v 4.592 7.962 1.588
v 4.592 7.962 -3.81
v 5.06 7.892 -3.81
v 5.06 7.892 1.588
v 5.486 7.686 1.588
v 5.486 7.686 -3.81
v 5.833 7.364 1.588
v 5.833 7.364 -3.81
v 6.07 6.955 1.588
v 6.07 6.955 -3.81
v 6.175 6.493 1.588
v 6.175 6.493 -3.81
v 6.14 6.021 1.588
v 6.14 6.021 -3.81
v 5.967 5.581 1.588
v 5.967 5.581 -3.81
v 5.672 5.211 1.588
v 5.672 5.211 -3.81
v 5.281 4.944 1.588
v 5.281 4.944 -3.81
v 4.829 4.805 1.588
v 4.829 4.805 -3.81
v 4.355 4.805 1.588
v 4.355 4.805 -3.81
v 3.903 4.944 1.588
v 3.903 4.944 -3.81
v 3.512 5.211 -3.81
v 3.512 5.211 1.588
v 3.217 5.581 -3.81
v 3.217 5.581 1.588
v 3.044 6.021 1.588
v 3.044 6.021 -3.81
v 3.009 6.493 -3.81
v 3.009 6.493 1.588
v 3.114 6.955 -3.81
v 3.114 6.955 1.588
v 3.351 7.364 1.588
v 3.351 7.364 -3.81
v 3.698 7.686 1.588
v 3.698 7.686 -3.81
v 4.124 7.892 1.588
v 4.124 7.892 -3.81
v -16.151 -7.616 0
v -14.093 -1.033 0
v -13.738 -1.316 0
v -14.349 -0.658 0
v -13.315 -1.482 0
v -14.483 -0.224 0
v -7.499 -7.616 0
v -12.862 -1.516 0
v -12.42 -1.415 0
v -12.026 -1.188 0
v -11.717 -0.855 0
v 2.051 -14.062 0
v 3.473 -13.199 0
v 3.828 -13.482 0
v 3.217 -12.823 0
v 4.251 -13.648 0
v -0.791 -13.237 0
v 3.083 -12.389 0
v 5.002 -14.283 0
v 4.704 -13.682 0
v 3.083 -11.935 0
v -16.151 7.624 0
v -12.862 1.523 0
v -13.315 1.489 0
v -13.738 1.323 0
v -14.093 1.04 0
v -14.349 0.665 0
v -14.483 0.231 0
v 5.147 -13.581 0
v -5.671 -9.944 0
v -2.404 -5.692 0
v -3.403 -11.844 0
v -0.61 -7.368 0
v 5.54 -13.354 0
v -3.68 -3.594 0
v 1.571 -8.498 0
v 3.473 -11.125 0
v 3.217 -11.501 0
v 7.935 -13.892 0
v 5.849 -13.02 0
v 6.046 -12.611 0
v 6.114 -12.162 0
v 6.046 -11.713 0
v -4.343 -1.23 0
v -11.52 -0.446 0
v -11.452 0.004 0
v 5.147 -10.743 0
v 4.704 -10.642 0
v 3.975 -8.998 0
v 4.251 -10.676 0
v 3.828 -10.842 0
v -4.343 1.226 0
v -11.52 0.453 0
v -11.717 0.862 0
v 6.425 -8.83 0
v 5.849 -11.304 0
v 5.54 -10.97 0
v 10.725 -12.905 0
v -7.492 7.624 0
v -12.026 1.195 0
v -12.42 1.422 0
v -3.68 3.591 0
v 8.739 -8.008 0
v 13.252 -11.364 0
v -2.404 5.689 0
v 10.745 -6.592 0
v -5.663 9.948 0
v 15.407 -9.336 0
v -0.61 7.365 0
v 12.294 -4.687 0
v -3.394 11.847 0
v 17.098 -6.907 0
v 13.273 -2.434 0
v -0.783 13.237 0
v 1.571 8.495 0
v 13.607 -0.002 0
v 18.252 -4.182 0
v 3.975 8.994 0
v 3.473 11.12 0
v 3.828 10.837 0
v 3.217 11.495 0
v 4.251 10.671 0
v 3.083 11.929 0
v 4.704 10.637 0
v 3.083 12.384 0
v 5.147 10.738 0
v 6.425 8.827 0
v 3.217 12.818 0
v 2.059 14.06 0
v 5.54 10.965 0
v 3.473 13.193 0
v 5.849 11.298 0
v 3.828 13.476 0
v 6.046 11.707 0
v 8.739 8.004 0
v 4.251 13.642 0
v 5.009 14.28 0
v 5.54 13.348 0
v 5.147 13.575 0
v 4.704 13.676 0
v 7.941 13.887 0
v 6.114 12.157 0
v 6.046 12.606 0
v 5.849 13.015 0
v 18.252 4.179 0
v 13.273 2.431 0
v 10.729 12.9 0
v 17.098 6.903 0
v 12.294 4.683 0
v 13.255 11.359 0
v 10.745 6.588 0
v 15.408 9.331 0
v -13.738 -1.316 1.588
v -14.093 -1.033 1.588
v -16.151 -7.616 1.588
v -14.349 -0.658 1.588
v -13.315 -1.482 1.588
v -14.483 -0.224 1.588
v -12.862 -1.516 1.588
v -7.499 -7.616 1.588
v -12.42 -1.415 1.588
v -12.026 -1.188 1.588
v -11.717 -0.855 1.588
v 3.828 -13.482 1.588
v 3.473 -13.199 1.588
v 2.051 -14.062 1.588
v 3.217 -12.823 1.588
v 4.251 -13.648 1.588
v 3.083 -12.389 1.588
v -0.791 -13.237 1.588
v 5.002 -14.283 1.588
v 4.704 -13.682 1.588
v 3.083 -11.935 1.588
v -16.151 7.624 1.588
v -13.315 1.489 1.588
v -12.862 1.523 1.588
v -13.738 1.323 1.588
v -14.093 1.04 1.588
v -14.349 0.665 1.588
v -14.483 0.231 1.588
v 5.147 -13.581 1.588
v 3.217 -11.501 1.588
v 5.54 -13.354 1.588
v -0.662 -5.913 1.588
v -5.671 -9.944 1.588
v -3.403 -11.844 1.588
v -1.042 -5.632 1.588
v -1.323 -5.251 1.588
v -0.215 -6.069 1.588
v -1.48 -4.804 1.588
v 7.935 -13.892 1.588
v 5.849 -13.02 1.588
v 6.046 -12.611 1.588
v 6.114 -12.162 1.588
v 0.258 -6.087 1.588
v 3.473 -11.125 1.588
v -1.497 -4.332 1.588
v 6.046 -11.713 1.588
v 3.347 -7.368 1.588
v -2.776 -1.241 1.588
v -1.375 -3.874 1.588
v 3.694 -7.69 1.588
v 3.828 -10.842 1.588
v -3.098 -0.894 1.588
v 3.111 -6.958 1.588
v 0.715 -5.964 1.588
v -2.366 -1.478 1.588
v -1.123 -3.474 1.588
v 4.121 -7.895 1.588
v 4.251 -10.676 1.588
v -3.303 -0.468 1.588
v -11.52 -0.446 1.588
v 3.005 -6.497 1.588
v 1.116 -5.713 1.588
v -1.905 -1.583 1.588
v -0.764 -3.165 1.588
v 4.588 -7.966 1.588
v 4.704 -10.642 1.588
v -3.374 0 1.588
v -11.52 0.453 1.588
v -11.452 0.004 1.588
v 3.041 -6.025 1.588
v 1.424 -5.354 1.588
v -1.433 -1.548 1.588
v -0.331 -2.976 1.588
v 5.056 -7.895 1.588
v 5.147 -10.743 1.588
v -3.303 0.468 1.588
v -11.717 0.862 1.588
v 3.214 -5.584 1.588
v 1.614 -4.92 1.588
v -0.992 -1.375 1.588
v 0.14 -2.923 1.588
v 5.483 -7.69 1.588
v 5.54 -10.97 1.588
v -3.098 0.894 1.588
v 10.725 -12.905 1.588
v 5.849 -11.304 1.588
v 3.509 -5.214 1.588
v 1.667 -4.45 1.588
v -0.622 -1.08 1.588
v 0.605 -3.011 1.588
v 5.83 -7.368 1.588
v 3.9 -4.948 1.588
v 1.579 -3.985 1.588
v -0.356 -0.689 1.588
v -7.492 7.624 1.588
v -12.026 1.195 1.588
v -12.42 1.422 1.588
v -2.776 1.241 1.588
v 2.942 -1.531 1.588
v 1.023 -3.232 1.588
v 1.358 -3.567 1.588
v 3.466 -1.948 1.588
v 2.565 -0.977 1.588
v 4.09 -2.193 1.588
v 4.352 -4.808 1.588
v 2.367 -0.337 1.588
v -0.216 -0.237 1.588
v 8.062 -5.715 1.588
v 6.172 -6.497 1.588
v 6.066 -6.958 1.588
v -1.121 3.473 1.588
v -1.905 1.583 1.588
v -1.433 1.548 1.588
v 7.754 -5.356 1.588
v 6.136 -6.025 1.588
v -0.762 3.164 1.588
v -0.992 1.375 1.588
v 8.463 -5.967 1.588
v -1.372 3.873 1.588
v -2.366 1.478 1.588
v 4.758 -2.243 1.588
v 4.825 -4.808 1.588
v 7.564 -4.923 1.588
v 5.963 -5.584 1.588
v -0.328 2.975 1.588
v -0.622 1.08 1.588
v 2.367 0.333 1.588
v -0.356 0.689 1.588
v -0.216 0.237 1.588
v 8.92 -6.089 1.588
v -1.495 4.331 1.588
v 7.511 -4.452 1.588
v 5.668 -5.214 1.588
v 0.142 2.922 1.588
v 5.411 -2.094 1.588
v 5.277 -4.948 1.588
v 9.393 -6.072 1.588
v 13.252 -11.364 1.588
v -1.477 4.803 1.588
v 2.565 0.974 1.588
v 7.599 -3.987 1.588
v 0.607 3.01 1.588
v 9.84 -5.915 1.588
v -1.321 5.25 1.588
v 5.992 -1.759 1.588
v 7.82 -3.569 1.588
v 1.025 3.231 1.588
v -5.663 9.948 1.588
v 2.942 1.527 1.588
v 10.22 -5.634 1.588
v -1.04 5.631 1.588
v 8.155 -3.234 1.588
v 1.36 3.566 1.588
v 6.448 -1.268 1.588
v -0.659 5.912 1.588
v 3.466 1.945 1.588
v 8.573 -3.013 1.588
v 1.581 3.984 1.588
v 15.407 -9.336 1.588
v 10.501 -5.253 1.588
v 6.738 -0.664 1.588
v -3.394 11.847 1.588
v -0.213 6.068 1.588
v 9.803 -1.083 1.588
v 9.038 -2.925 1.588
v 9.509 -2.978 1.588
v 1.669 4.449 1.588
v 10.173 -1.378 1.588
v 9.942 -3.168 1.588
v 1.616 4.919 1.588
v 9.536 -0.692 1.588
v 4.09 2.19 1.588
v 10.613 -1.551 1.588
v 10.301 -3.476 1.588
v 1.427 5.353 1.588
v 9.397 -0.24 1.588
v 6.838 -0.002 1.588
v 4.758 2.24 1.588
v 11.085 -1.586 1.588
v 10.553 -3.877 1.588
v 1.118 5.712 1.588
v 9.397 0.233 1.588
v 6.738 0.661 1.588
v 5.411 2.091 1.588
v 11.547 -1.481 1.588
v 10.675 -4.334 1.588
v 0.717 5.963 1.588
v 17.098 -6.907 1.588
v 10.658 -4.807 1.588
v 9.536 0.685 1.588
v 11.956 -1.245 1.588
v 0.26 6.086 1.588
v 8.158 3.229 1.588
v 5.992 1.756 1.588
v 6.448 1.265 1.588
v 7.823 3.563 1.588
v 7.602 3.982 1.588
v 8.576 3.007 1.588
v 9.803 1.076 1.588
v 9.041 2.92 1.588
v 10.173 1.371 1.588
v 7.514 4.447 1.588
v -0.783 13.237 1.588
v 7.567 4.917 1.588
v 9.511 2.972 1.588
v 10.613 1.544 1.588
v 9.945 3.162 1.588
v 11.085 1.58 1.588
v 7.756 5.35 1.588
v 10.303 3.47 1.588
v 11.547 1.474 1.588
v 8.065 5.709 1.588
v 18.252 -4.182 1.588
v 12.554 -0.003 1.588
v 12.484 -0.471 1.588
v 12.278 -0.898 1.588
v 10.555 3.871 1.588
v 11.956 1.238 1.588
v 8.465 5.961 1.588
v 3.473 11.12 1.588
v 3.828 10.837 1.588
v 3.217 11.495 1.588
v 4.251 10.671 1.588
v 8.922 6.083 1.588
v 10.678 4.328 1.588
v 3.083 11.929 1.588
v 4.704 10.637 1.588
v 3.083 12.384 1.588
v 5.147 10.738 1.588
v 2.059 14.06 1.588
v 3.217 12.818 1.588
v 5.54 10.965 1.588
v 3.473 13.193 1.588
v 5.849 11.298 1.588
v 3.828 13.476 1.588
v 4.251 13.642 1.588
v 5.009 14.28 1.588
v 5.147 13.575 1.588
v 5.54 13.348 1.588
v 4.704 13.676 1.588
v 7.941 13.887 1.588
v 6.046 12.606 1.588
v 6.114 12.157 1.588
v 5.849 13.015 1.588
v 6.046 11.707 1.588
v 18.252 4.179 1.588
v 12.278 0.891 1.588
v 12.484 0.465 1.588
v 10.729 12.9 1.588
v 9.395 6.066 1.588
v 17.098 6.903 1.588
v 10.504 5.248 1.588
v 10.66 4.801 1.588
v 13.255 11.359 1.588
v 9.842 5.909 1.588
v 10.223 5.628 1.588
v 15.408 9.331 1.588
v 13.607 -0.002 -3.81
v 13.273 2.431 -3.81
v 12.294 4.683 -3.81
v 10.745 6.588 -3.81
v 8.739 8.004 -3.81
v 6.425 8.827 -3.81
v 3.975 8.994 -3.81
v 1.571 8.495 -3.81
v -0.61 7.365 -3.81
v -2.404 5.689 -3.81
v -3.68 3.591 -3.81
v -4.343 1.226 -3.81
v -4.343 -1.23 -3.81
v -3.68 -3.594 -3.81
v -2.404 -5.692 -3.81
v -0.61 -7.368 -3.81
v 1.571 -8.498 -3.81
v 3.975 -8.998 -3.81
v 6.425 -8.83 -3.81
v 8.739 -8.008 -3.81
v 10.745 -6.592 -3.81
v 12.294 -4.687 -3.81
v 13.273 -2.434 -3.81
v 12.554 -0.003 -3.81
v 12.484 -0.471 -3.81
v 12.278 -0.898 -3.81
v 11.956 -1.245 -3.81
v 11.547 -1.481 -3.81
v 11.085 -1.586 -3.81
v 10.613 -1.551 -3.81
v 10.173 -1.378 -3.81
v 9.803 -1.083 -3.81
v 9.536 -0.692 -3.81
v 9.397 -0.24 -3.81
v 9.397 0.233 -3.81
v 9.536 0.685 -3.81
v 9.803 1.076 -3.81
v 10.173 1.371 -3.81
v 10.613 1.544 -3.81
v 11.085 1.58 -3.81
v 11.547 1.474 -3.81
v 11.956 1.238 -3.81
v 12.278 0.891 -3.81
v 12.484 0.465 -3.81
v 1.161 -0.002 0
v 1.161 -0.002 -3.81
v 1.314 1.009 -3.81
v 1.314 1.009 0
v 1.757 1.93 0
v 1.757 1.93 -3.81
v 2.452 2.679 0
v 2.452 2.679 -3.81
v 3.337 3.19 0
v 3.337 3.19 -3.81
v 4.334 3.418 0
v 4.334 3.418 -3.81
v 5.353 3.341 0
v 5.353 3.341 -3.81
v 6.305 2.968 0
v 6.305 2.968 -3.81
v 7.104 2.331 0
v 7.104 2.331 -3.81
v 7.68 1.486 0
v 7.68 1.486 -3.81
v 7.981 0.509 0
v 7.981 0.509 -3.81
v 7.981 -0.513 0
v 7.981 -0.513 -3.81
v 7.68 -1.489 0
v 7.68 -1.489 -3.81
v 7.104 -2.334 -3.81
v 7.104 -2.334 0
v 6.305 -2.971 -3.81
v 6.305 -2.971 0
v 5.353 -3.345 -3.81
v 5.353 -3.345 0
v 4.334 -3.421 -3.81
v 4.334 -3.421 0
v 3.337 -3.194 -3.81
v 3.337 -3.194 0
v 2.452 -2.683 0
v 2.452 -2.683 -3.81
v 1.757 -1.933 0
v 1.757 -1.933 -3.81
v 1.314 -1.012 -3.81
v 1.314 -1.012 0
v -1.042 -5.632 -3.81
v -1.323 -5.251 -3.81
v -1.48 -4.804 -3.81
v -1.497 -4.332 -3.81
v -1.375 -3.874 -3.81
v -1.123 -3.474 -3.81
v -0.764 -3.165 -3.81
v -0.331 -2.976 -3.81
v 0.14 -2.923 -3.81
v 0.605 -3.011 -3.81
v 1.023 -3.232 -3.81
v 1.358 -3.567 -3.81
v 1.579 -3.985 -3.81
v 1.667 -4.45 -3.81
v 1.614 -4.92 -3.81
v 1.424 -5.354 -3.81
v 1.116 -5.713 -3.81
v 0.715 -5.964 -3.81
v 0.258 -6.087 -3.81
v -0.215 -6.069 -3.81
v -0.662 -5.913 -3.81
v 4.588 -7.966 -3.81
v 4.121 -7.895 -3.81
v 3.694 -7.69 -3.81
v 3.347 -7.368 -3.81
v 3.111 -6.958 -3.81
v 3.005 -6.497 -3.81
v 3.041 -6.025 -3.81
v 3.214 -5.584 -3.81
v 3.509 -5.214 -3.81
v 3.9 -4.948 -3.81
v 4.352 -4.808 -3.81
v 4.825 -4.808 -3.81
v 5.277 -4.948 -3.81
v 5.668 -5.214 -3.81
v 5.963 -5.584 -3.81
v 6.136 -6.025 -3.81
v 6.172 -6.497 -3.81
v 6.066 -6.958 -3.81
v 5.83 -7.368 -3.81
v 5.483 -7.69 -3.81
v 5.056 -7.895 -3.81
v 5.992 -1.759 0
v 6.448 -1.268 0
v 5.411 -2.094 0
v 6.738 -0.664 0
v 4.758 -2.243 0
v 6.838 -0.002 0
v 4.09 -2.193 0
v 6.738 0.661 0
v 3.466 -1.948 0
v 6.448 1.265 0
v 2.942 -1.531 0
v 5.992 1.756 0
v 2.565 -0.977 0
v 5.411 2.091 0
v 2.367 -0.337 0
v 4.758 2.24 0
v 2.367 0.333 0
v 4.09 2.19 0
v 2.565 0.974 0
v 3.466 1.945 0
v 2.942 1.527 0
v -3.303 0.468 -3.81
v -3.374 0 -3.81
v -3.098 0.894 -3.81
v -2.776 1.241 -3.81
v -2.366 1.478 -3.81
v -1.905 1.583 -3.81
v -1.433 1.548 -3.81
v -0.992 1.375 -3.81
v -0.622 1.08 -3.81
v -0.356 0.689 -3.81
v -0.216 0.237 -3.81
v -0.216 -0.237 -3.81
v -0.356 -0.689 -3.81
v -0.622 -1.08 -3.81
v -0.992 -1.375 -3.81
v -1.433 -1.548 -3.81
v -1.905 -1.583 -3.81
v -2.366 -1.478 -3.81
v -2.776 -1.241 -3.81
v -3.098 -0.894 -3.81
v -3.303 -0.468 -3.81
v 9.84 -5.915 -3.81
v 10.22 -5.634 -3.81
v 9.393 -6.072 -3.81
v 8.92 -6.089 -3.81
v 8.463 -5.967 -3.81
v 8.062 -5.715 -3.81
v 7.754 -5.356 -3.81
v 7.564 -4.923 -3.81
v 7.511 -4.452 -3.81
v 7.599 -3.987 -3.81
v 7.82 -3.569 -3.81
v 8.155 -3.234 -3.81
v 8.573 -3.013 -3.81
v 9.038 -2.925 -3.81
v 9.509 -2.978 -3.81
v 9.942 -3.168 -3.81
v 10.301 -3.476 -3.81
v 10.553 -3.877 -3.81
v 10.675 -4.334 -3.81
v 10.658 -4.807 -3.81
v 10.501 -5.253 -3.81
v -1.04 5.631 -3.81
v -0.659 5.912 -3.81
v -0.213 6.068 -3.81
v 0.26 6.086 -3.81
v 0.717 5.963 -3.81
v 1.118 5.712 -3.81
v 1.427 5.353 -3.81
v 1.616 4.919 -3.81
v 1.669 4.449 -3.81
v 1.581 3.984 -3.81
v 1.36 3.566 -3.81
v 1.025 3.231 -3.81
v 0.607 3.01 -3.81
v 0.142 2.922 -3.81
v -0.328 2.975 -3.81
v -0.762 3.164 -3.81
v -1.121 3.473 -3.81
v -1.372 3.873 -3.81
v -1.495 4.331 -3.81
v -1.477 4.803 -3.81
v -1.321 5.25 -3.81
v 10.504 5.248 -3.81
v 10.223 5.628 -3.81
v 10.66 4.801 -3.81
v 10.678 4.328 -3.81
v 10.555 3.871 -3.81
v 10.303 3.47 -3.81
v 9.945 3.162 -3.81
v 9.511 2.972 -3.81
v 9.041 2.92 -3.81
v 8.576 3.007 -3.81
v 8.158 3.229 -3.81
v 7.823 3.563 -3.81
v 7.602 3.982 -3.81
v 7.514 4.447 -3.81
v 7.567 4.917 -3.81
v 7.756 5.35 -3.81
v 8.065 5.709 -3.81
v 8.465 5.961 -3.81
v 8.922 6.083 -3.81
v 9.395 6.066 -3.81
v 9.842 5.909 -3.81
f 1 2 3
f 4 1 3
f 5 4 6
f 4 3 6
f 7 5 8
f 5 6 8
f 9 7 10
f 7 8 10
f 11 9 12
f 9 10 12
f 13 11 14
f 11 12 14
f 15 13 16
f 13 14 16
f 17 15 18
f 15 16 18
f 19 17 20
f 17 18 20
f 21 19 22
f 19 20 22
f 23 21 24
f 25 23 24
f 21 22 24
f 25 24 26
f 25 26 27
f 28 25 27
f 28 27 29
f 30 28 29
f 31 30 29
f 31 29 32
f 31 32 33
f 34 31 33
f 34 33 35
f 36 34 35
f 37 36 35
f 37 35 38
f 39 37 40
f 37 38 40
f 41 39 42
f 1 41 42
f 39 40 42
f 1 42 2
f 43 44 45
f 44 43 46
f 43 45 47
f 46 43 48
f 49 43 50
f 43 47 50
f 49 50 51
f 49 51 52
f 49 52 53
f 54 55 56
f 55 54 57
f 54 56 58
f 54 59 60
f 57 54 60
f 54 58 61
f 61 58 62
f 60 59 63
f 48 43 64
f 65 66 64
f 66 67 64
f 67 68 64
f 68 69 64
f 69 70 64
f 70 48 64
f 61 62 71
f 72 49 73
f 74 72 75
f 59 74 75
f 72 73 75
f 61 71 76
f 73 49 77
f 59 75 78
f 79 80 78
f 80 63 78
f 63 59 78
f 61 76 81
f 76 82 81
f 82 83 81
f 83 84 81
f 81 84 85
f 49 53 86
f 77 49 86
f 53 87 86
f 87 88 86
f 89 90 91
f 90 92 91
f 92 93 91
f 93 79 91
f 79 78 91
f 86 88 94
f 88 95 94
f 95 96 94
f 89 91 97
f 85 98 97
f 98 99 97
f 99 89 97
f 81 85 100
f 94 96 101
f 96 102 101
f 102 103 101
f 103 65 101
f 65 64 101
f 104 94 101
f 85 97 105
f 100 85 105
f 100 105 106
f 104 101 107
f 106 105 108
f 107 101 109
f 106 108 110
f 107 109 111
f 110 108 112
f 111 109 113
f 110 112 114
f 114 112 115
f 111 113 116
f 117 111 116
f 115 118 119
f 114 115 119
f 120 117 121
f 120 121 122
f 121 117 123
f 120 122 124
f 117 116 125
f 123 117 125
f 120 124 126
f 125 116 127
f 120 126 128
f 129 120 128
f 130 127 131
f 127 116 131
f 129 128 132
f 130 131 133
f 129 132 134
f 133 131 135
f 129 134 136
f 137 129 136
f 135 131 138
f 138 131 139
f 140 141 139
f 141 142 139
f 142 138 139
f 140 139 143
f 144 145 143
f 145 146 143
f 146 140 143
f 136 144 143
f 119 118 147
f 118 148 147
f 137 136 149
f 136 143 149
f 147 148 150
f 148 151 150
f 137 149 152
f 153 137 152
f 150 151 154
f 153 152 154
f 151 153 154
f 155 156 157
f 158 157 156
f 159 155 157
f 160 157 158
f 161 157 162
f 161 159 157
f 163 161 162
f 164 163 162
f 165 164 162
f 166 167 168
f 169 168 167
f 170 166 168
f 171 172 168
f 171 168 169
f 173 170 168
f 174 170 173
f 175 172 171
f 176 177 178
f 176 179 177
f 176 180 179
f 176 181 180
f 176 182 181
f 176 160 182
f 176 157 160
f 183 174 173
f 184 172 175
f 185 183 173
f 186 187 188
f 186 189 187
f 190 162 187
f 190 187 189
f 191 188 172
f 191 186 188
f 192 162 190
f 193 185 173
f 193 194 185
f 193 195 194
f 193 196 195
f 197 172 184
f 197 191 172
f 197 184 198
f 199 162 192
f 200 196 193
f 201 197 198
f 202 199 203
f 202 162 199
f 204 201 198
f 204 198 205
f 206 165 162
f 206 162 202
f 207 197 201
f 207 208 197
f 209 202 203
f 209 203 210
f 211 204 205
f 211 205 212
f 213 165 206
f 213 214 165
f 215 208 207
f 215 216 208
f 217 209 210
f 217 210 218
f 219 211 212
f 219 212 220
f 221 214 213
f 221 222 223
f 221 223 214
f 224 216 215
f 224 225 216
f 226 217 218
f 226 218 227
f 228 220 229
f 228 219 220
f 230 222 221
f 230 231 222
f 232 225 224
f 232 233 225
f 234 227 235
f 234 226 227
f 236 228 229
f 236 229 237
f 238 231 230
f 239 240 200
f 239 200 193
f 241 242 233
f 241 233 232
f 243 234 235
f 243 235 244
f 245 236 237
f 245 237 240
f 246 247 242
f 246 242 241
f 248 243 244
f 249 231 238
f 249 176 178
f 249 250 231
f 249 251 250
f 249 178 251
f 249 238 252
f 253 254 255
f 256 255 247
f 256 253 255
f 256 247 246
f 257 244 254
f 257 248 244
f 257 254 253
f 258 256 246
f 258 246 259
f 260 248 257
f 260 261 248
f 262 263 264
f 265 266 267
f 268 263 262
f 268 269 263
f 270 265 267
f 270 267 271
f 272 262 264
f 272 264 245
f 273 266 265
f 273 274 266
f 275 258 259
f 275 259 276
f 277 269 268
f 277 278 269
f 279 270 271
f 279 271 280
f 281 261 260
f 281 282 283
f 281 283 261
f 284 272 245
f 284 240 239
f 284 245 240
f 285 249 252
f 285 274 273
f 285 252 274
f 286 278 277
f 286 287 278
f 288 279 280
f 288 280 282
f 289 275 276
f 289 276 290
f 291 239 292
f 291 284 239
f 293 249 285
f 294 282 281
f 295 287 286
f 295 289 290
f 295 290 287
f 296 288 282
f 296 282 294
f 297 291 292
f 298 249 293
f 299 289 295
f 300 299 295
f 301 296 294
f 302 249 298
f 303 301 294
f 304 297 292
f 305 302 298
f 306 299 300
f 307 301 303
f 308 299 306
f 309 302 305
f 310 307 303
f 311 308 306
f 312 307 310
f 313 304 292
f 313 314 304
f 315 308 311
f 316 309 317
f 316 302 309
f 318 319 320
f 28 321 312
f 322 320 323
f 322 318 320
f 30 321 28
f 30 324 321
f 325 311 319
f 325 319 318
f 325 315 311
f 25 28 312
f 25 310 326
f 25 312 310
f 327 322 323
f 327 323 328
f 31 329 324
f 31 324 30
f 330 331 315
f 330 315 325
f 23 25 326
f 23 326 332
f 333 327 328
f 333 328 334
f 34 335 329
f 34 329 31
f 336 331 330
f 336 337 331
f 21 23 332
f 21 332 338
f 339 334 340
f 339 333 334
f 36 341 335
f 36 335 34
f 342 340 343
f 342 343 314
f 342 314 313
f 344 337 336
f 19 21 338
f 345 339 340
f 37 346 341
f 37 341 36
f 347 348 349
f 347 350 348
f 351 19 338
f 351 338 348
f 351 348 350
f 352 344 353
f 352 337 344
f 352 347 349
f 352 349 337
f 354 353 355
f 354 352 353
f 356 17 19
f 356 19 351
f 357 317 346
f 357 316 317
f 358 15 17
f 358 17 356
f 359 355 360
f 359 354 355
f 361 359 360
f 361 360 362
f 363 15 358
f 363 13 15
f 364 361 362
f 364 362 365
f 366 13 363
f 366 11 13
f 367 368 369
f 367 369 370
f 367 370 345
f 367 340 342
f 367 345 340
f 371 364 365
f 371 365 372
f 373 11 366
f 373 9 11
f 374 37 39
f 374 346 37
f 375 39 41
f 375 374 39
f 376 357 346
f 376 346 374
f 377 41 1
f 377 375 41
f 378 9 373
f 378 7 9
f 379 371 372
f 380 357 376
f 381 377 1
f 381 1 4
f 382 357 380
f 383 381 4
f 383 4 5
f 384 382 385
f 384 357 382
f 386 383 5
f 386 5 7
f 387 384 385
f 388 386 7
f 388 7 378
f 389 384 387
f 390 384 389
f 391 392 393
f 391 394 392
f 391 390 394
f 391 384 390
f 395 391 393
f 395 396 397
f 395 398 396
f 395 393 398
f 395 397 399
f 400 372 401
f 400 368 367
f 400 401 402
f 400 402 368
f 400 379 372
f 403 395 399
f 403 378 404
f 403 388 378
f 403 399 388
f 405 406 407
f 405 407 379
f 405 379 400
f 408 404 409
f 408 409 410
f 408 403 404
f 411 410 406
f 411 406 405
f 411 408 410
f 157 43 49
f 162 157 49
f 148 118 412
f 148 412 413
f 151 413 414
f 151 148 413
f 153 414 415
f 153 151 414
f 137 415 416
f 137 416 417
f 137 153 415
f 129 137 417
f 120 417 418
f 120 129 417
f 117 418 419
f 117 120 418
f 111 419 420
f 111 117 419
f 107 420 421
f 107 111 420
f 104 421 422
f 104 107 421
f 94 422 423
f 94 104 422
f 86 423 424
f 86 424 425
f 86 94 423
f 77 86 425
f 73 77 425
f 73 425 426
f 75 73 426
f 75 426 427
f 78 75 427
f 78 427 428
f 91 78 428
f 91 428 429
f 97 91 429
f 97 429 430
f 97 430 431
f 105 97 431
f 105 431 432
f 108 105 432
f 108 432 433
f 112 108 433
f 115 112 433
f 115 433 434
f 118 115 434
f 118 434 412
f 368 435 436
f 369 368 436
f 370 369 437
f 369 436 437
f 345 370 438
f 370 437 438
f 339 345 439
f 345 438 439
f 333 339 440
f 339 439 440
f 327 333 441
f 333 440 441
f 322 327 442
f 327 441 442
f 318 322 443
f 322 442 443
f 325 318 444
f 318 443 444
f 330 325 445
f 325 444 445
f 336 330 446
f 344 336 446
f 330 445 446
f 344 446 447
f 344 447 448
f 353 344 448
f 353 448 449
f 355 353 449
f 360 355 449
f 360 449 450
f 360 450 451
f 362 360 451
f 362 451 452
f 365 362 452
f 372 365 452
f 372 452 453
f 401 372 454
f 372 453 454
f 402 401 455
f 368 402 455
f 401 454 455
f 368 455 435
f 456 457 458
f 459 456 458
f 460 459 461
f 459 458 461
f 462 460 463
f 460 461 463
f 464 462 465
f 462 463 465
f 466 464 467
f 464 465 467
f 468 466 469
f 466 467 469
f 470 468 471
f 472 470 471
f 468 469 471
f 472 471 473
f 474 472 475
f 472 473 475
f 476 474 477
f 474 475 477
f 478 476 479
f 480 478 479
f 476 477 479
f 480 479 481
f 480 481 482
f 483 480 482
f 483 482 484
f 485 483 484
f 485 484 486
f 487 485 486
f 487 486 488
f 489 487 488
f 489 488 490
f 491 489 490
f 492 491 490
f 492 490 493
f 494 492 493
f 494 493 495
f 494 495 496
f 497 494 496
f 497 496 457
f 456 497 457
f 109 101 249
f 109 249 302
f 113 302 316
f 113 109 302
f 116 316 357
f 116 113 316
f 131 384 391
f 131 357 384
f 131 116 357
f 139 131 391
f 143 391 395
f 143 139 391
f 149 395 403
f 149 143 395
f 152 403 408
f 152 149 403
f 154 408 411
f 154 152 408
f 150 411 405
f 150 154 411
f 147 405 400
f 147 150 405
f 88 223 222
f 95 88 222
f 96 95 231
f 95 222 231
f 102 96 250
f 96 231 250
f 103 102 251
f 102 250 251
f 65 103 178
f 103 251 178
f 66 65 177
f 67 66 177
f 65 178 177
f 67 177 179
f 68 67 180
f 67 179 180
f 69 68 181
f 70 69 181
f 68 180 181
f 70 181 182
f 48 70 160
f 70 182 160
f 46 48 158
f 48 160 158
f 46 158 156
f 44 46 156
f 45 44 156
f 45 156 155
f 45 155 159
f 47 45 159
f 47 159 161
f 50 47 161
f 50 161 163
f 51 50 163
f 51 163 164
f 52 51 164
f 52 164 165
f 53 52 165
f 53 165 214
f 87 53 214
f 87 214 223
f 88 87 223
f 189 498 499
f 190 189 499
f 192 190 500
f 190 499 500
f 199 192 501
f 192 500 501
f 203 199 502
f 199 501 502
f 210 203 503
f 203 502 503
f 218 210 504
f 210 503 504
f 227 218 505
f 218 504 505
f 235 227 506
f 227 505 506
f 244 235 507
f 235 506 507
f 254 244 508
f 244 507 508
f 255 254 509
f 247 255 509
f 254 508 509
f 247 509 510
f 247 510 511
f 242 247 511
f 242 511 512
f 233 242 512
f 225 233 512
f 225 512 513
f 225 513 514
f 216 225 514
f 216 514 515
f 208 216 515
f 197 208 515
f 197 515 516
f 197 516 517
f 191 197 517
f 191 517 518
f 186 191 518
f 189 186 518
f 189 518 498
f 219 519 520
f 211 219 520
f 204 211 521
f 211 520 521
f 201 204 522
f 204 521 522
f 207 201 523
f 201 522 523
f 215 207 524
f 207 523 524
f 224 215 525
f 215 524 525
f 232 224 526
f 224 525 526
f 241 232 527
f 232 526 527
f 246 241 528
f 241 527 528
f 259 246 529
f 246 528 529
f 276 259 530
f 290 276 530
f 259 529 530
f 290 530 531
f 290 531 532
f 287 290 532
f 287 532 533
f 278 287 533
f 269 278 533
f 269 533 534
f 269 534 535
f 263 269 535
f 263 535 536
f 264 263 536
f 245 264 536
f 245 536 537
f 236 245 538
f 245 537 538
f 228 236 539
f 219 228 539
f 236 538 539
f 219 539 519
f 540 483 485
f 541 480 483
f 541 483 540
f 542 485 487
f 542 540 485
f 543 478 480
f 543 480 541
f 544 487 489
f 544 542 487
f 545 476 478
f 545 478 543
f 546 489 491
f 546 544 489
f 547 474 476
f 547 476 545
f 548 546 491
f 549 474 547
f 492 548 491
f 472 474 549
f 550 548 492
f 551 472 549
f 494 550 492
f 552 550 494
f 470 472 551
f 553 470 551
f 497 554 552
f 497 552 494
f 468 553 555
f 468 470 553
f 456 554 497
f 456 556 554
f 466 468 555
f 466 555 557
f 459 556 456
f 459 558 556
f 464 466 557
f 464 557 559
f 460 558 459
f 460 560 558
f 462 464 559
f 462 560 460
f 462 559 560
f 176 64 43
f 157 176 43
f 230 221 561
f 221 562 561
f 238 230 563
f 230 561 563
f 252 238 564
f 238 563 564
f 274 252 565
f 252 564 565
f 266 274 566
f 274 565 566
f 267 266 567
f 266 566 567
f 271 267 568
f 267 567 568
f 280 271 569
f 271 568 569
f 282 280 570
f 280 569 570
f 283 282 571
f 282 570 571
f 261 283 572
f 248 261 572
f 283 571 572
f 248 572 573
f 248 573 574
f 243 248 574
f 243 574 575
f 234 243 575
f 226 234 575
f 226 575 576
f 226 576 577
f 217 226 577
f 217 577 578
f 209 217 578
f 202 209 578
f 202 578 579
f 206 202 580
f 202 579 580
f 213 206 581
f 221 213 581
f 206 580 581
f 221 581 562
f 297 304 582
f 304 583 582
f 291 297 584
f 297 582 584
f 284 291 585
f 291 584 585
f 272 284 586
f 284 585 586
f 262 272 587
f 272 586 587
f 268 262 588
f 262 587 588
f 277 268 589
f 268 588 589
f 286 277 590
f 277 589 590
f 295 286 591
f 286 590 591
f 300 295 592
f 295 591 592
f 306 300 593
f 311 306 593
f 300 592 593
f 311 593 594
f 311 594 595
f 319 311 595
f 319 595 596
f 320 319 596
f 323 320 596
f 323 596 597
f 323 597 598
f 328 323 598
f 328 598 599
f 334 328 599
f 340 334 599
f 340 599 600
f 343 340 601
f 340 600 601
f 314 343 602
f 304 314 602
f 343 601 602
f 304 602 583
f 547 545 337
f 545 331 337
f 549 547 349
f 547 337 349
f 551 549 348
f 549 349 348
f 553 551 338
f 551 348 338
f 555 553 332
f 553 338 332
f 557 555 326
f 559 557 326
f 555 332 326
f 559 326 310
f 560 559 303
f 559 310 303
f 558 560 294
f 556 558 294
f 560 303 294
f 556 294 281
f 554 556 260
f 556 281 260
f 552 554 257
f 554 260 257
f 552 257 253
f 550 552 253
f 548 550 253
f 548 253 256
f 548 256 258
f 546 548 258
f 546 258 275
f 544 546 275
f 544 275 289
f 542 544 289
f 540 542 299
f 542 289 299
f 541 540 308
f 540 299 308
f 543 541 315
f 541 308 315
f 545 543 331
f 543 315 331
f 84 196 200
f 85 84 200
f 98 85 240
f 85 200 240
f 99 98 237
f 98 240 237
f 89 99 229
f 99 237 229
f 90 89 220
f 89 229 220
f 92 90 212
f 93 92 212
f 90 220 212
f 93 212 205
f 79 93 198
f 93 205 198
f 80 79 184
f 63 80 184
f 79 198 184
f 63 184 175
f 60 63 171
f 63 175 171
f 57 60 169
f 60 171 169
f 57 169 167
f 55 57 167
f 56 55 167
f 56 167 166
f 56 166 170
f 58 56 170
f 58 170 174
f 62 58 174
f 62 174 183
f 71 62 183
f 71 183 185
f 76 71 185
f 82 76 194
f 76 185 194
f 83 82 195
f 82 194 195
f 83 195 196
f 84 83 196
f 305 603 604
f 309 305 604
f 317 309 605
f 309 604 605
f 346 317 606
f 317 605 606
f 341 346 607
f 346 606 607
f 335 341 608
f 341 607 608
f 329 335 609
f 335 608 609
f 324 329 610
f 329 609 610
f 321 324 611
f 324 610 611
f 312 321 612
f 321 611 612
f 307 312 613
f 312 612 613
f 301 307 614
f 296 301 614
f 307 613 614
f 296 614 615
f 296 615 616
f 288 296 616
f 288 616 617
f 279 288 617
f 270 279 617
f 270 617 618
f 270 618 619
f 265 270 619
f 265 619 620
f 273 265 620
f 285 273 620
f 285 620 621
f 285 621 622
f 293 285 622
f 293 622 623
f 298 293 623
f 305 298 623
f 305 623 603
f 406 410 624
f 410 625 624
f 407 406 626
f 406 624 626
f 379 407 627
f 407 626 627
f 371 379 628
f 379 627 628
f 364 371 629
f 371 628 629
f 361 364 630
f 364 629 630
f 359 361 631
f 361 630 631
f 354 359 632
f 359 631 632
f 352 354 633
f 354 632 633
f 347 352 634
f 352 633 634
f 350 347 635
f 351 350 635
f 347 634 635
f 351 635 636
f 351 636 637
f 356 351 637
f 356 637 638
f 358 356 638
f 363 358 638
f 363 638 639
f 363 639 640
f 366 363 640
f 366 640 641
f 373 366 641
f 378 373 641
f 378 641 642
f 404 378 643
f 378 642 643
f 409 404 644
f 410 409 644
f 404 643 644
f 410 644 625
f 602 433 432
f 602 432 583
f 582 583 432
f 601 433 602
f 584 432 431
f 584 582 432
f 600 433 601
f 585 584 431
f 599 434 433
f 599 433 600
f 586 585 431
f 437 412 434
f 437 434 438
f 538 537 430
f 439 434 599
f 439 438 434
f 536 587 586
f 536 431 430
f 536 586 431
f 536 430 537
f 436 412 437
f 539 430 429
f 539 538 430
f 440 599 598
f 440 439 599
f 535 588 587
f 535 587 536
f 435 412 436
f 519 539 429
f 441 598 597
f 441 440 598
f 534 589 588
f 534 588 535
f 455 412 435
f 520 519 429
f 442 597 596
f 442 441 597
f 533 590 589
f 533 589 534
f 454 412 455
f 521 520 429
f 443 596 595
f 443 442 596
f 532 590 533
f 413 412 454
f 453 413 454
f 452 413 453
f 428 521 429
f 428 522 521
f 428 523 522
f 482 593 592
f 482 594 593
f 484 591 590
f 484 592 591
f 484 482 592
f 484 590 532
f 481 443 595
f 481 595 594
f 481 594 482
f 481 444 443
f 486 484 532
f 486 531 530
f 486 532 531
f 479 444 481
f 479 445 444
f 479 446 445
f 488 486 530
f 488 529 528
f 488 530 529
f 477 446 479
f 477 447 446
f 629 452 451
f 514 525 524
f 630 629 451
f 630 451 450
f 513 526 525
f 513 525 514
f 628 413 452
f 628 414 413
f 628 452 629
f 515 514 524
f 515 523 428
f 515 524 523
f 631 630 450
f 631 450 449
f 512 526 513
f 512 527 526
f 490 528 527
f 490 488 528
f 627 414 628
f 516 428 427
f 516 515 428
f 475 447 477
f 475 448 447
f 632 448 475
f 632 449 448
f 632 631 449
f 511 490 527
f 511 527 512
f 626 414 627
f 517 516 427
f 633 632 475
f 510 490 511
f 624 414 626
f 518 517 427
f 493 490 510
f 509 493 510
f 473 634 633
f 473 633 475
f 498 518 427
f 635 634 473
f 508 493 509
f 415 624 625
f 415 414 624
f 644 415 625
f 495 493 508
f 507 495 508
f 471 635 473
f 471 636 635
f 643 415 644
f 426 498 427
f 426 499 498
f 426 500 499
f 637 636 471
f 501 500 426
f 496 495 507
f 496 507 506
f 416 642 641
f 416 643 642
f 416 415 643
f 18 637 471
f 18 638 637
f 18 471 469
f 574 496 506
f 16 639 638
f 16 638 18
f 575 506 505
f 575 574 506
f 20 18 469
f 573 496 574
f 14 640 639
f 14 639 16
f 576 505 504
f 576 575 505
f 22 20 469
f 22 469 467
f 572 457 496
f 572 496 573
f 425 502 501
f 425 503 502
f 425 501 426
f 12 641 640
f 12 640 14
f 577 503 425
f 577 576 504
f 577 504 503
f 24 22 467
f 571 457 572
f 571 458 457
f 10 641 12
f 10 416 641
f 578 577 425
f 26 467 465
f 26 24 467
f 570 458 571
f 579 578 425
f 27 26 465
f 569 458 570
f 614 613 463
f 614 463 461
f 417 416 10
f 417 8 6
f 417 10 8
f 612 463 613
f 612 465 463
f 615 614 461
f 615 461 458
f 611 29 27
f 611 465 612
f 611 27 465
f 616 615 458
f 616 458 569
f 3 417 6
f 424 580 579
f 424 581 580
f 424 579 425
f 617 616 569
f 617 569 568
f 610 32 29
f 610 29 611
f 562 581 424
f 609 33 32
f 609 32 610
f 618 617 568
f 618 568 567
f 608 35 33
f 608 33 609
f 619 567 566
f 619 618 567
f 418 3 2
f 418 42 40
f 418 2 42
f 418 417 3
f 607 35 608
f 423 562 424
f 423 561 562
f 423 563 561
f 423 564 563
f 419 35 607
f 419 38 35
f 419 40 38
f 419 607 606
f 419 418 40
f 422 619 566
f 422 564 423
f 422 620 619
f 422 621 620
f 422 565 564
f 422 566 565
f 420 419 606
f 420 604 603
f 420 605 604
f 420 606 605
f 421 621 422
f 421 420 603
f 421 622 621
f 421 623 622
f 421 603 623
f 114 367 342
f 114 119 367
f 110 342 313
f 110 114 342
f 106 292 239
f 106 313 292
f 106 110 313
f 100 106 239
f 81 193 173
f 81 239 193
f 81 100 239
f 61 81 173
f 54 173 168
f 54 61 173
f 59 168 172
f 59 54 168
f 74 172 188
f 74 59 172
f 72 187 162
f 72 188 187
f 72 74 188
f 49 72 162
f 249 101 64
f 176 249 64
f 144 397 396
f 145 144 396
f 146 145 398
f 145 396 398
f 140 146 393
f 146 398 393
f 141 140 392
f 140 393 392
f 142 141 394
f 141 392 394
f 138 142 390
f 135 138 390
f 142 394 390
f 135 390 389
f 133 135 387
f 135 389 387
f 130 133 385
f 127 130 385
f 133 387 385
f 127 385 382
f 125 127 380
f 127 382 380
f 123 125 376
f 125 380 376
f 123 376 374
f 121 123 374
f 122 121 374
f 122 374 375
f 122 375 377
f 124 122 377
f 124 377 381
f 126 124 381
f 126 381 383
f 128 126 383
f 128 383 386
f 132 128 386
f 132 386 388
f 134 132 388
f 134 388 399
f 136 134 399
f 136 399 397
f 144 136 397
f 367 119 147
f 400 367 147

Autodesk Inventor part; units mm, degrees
ref_plane "YZ Plane" through (0, 0, 0) normal (1, 0, 0) x (0, 1, 0)
ref_plane "XZ Plane" through (0, 0, 0) normal (0, 1, 0) x (-1, 0, 0)
ref_plane "XY Plane" through (0, 0, 0) normal (0, 0, 1) x (1, 0, 0)
sketch "Sketch1" plane through (0, 0, 0) normal (0, 0, 1) x (1, 0, 0)
  circle A0 centre (4.5902, 12.1566) radius 1.27 projected
  circle A1 centre (4.5902, -12.1619) radius 1.27 projected
  circle A2 centre (-12.9763, 0.0036) radius 1.27 projected
  line L0 (18.2524, -4.1824) -> (18.2524, 4.1791) projected
  arc A3 (18.2524, 4.1791) -> (-7.4923, 7.6236) centre (4.5902, -0.0017) ccw projected
  line L1 (-7.4923, 7.6236) -> (-16.1513, 7.6236) projected
  line L2 (-16.1513, 7.6236) -> (-16.1513, -7.6164) projected
  line L3 (-16.1513, -7.6164) -> (-7.4989, -7.6164) projected
  arc A4 (-7.4989, -7.6164) -> (18.2524, -4.1824) centre (4.5902, -0.0017) ccw projected
  line L4 (-4.9271, -3.1767) -> (-8.2305, -3.1767) projected
  arc A5 (-8.2305, 3.1733) -> (-8.2305, -3.1767) centre (4.5902, -0.0017) ccw projected
  line L5 (-8.2305, 3.1733) -> (-4.9271, 3.1733) projected
  arc A6 (-4.9271, -3.1767) -> (-4.9271, 3.1733) centre (4.5902, -0.0017) ccw projected
  circle A7 centre (4.5902, -0.0017) radius 3.175 projected
  circle A8 centre (4.5902, -0.0017) radius 9.017
  circle A9 centre (4.5902, -0.0017) radius 4.953
  point P0 (0, 0)
  dimension "d0" = 1.778
  dimension "d1" = 1.016
extrude "Extrusion1" add sketch "Sketch1" against normal blind 19.05 contours A8
sketch "Sketch2" plane through (4.5902, -0.0017, 0) normal (0, 0, 1) x (1, 0, 0)
  circle A0 centre (0, 0) radius 4.953 projected
  point P0 (-4.5902, 0.0017)
extrude "Extrusion2" add sketch "Sketch2" against normal blind 7.62
sketch "Sketch3" plane through (0, 0, 0) normal (1, 0, 0) x (0, 1, 0)
  line L0 (3.1733, -8.4292) -> (-3.1767, -8.4292) projected
  point P0 (0, 0)
sketch "Sketch5" plane through (4.5902, -0.0017, 0) normal (0, 0, 1) x (1, 0, 0)
  circle A0 centre (0, 12.1583) radius 1.27 projected
  circle A1 centre (0, -12.1603) radius 1.27 projected
  circle A2 centre (-17.5665, 0.0053) radius 1.27 projected
  line L0 (13.6621, -4.1808) -> (13.6621, 4.1808) projected
  arc A3 (13.6621, 4.1808) -> (-12.0826, 7.6253) centre (0, 0) ccw projected
  line L1 (-12.0826, 7.6253) -> (-20.7415, 7.6253) projected
  line L2 (-20.7415, 7.6253) -> (-20.7415, -7.6147) projected
  line L3 (-20.7415, -7.6147) -> (-12.0892, -7.6147) projected
  arc A4 (-12.0892, -7.6147) -> (13.6621, -4.1808) centre (0, 0) ccw projected
  line L4 (-9.5174, -3.175) -> (-12.8207, -3.175) projected
  arc A5 (-12.8207, 3.175) -> (-12.8207, -3.175) centre (0, 0) ccw projected
  line L5 (-12.8207, 3.175) -> (-9.5174, 3.175) projected
  arc A6 (-9.5174, -3.175) -> (-9.5174, 3.175) centre (0, 0) ccw projected
  point P0 (-4.5902, 0.0017)
extrude "Extrusion4" add sketch "Sketch5" along normal blind 1.5875 contours A4 L3 L2 L1 A3 L0 | L4 A5 L5 A6
sketch "Sketch6" plane through (4.5902, -0.0017, 1.5875) normal (0, 0, 1) x (1, 0, 0)
  circle A0 centre (0, -12.1603) radius 1.27 projected
  circle A1 centre (0, -12.1603) radius 1.524
  circle A2 centre (-17.5665, 0.0053) radius 1.27 projected
  circle A3 centre (-17.5665, 0.0053) radius 1.524
  circle A4 centre (0, 12.1583) radius 1.27 projected
  circle A5 centre (0, 12.1583) radius 1.524
  point P0 (-4.5902, 0.0017)
  dimension "d12" = 3.048
extrude "Extrusion5" cut sketch "Sketch6" against normal blind 1.5875
sketch "Sketch7" plane through (4.5902, -0.0017, -7.62) normal (0, 0, -1) x (-1, 0, 0)
  circle A0 centre (0, 0) radius 3.429
  point P0 (4.5902, 0.0017)
  dimension "d15" = 6.858
extrude "Extrusion6" cut sketch "Sketch7" against normal up to surface (7.62 mm away)
sketch "Sketch8" plane through (0, 0, 0) normal (0, 1, 0) x (-1, 0, 0)
  spline S0 degree 3 poles (-8.0192, -14.5252) (-8.0192, -14.0929) (-7.9325, -13.6329) (-7.5821, -12.7886) (-7.3185, -12.4041) (-6.7114, -11.797) (-6.3268, -11.5333) (-5.4824, -11.1829) (-5.0225, -11.0962) (-4.158, -11.0962) (-3.698, -11.1829) (-2.8537, -11.5333) (-2.4691, -11.797) (-1.862, -12.4041) (-1.5984, -12.7886) (-1.248, -13.6329) (-1.1612, -14.0929) (-1.1612, -14.9574) (-1.248, -15.4174) (-1.5984, -16.2617) (-1.862, -16.6463) (-2.4691, -17.2534) (-2.8537, -17.517) (-3.698, -17.8675) (-4.158, -17.9542) (-5.0225, -17.9542) (-5.4824, -17.8675) (-6.3268, -17.517) (-6.7114, -17.2534) (-7.3185, -16.6463) (-7.5821, -16.2617) (-7.9325, -15.4174) (-8.0192, -14.9574) (-8.0192, -14.5252) knots 0 0 0 0 0.129682 0.129682 0.259363 0.259363 0.389031 0.389031 0.5187 0.5187 0.648368 0.648368 0.778036 0.778036 0.907718 0.907718 1.037399 1.037399 1.167081 1.167081 1.296762 1.296762 1.426431 1.426431 1.556099 1.556099 1.685767 1.685767 1.815435 1.815435 1.945117 1.945117 2.074799 2.074799 2.074799 2.074799 projected
  point P0 (0, 0)
  point P1 (-8.0192, -14.5252)
extrude "Extrusion7" cut sketch "Sketch8" against normal blind 25.4
sketch "Sketch9" plane through (0, 0, 0) normal (1, 0, 0) x (0, 1, 0)
  line L0 (6.3536, -8.255) -> (-6.3464, -8.255) projected
  line L1 (-5.4574, -16.7982) -> (5.4646, -16.7982) projected
  line L2 (5.4646, -8.255) -> (5.4646, -66.0222) projected
  line L3 (-5.4574, -66.0222) -> (-5.4574, -8.255) projected
  line L4 (4.9513, -7.62) -> (4.9513, -19.05) projected
  line L5 (4.9513, -8.255) -> (-5.4574, -8.255)
  line L6 (-5.4574, -8.255) -> (-5.4574, -16.7982)
  line L7 (-5.4574, -16.7982) -> (4.9513, -16.7982)
  line L8 (4.9513, -16.7982) -> (4.9513, -8.255)
  line L9 (4.0885, -8.255) -> (-4.122, -8.255)
  line L10 (-4.122, -8.255) -> (-4.122, -14.2031)
  line L11 (-4.122, -14.2031) -> (4.0885, -14.2031)
  line L12 (4.0885, -14.2031) -> (4.0885, -8.255)
  line L13 (3.81, -8.255) -> (-3.81, -8.255)
  line L14 (-3.81, -8.255) -> (-3.81, -14.605)
  line L15 (-3.81, -14.605) -> (3.81, -14.605)
  line L16 (3.81, -14.605) -> (3.81, -8.255)
  point P0 (0, 0)
  point P1 (0, -14.605)
  dimension "d22" = 6.35
  dimension "d23" = 7.62
extrude "Extrusion8" cut sketch "Sketch9" along normal mid plane 12.7 contours L16 L11 L14 L0 | L16 L15 L14 L11
sketch "Sketch10" plane through (4.5902, -0.0017, 1.5875) normal (0, 0, 1) x (1, 0, 0)
  circle A0 centre (0, 0) radius 3.429 projected
  circle A1 centre (0, 0) radius 2.2479
  point P0 (-4.5902, 0.0017)
  dimension "d24" = 4.4958
extrude "Extrusion9" cut sketch "Sketch10" against normal blind 25.4 contours A1
sketch "Sketch11" plane through (4.5902, -0.0017, -7.62) normal (0, 0, -1) x (-1, 0, 0)
  circle A0 centre (0, 0) radius 4.953
  point P0 (4.5902, 0.0017)
extrude "Extrusion10" cut sketch "Sketch11" against normal blind 3.81
sketch "Sketch12" plane through (4.5902, -0.0017, -19.05) normal (0, 0, -1) x (-1, 0, 0)
  circle A0 centre (0, 0) radius 2.2479 projected
  circle A1 centre (0, 0) radius 36.9649
  point P0 (4.5902, 0.0017)
extrude "Extrusion11" cut sketch "Sketch12" against normal up to surface (15.24 mm away)
sketch "Sketch13" plane through (4.5902, -0.0017, -3.81) normal (0, 0, -1) x (-1, 0, 0)
  circle A0 centre (6.3764, 0.0017) radius 1.5875
  point P0 (4.5902, 0.0017)
  dimension "d31" = 3.175
extrude "Extrusion12" cut sketch "Sketch13" against normal blind 25.4
pattern_circular "Circular Pattern1" count 8 over 360 about axis through (4.5902, -0.0017, 1.5875) along (0, 0, -1) of "Extrusion12"
properties part number "Small Heater Holder for Use With Fan"
